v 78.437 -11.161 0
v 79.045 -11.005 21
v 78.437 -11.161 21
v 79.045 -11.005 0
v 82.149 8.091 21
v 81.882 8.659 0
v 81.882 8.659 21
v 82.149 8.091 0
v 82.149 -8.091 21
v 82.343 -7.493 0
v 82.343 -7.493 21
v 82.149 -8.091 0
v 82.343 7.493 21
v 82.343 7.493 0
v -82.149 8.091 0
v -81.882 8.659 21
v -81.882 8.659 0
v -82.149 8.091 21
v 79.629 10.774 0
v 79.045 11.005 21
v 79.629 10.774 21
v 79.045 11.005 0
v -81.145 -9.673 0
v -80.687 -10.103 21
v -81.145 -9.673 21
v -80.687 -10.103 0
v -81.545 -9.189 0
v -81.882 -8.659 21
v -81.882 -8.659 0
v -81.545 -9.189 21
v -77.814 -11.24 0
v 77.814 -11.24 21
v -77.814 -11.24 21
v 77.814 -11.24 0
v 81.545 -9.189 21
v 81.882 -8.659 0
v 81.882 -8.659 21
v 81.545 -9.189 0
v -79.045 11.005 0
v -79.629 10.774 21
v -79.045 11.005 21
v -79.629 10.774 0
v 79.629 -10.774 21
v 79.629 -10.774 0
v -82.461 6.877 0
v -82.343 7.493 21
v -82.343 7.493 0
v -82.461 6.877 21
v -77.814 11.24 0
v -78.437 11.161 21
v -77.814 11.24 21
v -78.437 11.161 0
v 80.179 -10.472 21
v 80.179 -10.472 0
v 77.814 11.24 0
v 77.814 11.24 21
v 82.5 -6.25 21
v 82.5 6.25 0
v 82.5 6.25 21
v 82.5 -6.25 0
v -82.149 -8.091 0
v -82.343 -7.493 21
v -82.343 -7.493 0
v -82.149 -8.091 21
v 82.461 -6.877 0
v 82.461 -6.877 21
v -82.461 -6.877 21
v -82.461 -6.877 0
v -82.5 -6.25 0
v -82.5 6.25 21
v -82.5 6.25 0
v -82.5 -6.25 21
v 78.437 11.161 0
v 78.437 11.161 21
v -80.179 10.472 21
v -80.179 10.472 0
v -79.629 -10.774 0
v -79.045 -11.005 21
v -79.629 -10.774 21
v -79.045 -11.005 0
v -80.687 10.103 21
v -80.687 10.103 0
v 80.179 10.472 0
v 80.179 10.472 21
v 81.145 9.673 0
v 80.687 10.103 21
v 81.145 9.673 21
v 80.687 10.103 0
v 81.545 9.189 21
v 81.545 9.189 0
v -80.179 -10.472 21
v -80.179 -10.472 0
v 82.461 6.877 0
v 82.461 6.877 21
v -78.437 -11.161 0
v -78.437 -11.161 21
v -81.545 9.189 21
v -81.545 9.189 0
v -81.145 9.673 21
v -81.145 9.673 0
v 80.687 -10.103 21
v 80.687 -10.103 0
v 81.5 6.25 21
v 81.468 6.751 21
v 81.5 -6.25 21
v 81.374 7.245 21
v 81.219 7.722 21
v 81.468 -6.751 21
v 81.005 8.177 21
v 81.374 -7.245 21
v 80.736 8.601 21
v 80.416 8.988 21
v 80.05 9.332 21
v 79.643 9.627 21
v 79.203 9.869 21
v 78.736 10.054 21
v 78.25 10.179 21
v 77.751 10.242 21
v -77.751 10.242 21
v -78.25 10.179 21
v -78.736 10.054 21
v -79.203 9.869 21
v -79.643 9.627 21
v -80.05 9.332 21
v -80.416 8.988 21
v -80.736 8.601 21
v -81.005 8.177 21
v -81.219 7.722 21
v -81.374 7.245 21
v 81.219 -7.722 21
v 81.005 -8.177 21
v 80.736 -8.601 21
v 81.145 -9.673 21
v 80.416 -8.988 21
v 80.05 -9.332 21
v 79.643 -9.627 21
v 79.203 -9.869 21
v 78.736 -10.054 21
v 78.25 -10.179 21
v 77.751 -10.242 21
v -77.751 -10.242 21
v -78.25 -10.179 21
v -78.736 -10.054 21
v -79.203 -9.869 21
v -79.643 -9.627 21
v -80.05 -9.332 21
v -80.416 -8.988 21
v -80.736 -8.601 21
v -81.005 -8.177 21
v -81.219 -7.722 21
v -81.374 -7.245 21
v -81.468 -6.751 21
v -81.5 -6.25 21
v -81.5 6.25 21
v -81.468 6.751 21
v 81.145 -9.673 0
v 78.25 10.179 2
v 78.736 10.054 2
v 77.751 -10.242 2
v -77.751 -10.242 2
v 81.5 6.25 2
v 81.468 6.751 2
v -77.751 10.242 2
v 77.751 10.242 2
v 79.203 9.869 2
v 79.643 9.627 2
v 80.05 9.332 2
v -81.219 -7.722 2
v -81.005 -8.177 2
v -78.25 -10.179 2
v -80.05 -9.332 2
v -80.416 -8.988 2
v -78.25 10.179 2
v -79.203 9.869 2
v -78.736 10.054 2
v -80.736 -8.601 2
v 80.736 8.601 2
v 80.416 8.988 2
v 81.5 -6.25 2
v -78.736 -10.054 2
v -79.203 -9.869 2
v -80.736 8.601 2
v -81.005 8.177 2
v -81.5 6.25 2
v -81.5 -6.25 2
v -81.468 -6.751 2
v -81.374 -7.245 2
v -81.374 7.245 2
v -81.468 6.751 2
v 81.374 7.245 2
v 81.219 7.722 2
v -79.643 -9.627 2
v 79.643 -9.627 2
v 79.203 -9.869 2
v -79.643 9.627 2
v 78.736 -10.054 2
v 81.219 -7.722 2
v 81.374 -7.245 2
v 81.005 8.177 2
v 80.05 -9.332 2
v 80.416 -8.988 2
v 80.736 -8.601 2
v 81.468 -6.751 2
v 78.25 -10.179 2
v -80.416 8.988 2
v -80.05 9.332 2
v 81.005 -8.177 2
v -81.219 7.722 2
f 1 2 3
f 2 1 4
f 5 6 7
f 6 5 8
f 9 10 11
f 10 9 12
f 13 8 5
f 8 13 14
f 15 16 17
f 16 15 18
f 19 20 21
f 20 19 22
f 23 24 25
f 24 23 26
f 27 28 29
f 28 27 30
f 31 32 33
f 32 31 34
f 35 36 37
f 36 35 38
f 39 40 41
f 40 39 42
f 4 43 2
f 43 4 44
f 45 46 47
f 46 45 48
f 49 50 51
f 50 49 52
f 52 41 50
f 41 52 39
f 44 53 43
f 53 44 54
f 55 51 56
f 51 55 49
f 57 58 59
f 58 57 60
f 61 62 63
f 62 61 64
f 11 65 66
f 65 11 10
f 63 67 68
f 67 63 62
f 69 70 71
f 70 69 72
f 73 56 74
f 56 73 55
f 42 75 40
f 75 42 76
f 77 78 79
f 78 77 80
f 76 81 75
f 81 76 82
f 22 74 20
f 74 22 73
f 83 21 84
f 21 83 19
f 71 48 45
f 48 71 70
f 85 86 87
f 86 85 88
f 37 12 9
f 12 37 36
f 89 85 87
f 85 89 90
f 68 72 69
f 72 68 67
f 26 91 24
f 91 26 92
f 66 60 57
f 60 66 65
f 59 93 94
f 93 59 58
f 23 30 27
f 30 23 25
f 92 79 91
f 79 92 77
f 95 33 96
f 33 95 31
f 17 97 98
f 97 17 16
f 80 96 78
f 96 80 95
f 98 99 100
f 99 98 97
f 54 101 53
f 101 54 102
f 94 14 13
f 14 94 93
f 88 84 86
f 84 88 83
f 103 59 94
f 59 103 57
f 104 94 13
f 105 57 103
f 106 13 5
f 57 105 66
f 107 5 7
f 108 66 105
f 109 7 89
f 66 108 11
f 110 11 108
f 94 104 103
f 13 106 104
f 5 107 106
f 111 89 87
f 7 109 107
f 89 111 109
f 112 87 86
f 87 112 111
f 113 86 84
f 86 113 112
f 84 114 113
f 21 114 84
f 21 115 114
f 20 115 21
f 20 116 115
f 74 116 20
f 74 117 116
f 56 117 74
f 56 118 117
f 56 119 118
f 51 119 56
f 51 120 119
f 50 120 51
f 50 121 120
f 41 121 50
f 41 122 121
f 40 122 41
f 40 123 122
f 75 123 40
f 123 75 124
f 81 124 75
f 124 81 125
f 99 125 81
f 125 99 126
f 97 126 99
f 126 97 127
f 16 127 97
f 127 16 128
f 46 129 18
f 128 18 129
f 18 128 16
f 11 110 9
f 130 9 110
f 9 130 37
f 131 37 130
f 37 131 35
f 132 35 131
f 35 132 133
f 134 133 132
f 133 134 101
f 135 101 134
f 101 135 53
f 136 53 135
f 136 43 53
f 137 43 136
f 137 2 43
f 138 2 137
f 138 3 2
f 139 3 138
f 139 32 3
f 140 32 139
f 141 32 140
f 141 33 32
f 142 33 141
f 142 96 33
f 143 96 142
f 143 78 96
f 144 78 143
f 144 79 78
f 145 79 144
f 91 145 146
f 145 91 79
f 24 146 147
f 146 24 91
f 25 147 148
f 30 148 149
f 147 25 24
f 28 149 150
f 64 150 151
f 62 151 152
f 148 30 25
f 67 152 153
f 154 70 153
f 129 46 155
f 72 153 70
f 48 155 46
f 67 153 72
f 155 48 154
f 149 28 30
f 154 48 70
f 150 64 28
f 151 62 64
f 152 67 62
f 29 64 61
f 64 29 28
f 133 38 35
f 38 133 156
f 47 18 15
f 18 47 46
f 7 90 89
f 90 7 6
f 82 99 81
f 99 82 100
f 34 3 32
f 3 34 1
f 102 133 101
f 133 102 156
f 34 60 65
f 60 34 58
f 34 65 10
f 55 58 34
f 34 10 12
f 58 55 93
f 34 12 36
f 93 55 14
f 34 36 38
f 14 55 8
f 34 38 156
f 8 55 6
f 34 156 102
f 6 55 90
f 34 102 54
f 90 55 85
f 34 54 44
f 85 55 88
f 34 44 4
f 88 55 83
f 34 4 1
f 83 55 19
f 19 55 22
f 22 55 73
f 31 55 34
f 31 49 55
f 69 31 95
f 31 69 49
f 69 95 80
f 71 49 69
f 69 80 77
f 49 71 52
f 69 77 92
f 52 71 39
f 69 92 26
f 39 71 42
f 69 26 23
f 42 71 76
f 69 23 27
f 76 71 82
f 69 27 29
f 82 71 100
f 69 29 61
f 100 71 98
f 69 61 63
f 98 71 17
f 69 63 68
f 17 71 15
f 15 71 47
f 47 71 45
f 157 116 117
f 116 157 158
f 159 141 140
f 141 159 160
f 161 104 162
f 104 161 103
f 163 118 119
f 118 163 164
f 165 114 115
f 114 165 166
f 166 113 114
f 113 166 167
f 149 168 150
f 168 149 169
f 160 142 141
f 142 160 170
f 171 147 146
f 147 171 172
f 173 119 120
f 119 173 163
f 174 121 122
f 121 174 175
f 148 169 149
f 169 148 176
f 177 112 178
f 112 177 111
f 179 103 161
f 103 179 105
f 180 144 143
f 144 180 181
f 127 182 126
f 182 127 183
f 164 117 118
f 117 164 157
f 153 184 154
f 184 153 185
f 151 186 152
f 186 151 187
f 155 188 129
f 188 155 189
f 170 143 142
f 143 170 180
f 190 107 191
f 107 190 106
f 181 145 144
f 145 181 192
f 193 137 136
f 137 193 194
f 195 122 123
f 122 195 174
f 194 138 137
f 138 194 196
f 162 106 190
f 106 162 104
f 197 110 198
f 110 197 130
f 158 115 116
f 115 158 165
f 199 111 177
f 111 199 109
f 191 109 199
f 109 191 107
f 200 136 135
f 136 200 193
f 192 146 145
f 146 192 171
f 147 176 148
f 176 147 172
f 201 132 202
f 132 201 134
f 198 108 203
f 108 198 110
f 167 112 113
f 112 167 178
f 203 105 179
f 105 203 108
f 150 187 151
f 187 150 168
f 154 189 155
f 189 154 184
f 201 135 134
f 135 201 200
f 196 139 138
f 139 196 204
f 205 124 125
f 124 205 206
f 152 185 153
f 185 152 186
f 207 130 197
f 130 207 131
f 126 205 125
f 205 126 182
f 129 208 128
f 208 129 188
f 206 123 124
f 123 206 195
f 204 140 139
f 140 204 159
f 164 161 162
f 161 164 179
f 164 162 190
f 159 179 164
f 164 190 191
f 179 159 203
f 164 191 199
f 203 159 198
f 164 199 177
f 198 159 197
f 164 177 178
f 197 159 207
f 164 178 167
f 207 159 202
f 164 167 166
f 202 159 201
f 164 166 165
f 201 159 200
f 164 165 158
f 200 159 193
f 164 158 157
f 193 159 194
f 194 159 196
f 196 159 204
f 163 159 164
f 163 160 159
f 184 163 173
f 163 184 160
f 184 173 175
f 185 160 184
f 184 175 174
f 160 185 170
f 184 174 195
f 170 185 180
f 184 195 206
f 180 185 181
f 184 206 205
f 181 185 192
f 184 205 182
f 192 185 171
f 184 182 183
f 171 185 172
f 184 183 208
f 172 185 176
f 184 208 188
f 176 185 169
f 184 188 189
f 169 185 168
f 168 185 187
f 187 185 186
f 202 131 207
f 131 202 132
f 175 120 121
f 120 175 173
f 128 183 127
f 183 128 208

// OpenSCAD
$fn = 50;


difference() {
	union() {
		hull() {
			translate(v = [-77.5000000000, 6.2500000000, 0]) {
				cylinder(h = 21, r = 5);
			}
			translate(v = [77.5000000000, 6.2500000000, 0]) {
				cylinder(h = 21, r = 5);
			}
			translate(v = [-77.5000000000, -6.2500000000, 0]) {
				cylinder(h = 21, r = 5);
			}
			translate(v = [77.5000000000, -6.2500000000, 0]) {
				cylinder(h = 21, r = 5);
			}
		}
	}
	union() {
		translate(v = [0, 0, 2]) {
			hull() {
				translate(v = [-77.5000000000, 6.2500000000, 0]) {
					cylinder(h = 19, r = 4);
				}
				translate(v = [77.5000000000, 6.2500000000, 0]) {
					cylinder(h = 19, r = 4);
				}
				translate(v = [-77.5000000000, -6.2500000000, 0]) {
					cylinder(h = 19, r = 4);
				}
				translate(v = [77.5000000000, -6.2500000000, 0]) {
					cylinder(h = 19, r = 4);
				}
			}
		}
	}
}
